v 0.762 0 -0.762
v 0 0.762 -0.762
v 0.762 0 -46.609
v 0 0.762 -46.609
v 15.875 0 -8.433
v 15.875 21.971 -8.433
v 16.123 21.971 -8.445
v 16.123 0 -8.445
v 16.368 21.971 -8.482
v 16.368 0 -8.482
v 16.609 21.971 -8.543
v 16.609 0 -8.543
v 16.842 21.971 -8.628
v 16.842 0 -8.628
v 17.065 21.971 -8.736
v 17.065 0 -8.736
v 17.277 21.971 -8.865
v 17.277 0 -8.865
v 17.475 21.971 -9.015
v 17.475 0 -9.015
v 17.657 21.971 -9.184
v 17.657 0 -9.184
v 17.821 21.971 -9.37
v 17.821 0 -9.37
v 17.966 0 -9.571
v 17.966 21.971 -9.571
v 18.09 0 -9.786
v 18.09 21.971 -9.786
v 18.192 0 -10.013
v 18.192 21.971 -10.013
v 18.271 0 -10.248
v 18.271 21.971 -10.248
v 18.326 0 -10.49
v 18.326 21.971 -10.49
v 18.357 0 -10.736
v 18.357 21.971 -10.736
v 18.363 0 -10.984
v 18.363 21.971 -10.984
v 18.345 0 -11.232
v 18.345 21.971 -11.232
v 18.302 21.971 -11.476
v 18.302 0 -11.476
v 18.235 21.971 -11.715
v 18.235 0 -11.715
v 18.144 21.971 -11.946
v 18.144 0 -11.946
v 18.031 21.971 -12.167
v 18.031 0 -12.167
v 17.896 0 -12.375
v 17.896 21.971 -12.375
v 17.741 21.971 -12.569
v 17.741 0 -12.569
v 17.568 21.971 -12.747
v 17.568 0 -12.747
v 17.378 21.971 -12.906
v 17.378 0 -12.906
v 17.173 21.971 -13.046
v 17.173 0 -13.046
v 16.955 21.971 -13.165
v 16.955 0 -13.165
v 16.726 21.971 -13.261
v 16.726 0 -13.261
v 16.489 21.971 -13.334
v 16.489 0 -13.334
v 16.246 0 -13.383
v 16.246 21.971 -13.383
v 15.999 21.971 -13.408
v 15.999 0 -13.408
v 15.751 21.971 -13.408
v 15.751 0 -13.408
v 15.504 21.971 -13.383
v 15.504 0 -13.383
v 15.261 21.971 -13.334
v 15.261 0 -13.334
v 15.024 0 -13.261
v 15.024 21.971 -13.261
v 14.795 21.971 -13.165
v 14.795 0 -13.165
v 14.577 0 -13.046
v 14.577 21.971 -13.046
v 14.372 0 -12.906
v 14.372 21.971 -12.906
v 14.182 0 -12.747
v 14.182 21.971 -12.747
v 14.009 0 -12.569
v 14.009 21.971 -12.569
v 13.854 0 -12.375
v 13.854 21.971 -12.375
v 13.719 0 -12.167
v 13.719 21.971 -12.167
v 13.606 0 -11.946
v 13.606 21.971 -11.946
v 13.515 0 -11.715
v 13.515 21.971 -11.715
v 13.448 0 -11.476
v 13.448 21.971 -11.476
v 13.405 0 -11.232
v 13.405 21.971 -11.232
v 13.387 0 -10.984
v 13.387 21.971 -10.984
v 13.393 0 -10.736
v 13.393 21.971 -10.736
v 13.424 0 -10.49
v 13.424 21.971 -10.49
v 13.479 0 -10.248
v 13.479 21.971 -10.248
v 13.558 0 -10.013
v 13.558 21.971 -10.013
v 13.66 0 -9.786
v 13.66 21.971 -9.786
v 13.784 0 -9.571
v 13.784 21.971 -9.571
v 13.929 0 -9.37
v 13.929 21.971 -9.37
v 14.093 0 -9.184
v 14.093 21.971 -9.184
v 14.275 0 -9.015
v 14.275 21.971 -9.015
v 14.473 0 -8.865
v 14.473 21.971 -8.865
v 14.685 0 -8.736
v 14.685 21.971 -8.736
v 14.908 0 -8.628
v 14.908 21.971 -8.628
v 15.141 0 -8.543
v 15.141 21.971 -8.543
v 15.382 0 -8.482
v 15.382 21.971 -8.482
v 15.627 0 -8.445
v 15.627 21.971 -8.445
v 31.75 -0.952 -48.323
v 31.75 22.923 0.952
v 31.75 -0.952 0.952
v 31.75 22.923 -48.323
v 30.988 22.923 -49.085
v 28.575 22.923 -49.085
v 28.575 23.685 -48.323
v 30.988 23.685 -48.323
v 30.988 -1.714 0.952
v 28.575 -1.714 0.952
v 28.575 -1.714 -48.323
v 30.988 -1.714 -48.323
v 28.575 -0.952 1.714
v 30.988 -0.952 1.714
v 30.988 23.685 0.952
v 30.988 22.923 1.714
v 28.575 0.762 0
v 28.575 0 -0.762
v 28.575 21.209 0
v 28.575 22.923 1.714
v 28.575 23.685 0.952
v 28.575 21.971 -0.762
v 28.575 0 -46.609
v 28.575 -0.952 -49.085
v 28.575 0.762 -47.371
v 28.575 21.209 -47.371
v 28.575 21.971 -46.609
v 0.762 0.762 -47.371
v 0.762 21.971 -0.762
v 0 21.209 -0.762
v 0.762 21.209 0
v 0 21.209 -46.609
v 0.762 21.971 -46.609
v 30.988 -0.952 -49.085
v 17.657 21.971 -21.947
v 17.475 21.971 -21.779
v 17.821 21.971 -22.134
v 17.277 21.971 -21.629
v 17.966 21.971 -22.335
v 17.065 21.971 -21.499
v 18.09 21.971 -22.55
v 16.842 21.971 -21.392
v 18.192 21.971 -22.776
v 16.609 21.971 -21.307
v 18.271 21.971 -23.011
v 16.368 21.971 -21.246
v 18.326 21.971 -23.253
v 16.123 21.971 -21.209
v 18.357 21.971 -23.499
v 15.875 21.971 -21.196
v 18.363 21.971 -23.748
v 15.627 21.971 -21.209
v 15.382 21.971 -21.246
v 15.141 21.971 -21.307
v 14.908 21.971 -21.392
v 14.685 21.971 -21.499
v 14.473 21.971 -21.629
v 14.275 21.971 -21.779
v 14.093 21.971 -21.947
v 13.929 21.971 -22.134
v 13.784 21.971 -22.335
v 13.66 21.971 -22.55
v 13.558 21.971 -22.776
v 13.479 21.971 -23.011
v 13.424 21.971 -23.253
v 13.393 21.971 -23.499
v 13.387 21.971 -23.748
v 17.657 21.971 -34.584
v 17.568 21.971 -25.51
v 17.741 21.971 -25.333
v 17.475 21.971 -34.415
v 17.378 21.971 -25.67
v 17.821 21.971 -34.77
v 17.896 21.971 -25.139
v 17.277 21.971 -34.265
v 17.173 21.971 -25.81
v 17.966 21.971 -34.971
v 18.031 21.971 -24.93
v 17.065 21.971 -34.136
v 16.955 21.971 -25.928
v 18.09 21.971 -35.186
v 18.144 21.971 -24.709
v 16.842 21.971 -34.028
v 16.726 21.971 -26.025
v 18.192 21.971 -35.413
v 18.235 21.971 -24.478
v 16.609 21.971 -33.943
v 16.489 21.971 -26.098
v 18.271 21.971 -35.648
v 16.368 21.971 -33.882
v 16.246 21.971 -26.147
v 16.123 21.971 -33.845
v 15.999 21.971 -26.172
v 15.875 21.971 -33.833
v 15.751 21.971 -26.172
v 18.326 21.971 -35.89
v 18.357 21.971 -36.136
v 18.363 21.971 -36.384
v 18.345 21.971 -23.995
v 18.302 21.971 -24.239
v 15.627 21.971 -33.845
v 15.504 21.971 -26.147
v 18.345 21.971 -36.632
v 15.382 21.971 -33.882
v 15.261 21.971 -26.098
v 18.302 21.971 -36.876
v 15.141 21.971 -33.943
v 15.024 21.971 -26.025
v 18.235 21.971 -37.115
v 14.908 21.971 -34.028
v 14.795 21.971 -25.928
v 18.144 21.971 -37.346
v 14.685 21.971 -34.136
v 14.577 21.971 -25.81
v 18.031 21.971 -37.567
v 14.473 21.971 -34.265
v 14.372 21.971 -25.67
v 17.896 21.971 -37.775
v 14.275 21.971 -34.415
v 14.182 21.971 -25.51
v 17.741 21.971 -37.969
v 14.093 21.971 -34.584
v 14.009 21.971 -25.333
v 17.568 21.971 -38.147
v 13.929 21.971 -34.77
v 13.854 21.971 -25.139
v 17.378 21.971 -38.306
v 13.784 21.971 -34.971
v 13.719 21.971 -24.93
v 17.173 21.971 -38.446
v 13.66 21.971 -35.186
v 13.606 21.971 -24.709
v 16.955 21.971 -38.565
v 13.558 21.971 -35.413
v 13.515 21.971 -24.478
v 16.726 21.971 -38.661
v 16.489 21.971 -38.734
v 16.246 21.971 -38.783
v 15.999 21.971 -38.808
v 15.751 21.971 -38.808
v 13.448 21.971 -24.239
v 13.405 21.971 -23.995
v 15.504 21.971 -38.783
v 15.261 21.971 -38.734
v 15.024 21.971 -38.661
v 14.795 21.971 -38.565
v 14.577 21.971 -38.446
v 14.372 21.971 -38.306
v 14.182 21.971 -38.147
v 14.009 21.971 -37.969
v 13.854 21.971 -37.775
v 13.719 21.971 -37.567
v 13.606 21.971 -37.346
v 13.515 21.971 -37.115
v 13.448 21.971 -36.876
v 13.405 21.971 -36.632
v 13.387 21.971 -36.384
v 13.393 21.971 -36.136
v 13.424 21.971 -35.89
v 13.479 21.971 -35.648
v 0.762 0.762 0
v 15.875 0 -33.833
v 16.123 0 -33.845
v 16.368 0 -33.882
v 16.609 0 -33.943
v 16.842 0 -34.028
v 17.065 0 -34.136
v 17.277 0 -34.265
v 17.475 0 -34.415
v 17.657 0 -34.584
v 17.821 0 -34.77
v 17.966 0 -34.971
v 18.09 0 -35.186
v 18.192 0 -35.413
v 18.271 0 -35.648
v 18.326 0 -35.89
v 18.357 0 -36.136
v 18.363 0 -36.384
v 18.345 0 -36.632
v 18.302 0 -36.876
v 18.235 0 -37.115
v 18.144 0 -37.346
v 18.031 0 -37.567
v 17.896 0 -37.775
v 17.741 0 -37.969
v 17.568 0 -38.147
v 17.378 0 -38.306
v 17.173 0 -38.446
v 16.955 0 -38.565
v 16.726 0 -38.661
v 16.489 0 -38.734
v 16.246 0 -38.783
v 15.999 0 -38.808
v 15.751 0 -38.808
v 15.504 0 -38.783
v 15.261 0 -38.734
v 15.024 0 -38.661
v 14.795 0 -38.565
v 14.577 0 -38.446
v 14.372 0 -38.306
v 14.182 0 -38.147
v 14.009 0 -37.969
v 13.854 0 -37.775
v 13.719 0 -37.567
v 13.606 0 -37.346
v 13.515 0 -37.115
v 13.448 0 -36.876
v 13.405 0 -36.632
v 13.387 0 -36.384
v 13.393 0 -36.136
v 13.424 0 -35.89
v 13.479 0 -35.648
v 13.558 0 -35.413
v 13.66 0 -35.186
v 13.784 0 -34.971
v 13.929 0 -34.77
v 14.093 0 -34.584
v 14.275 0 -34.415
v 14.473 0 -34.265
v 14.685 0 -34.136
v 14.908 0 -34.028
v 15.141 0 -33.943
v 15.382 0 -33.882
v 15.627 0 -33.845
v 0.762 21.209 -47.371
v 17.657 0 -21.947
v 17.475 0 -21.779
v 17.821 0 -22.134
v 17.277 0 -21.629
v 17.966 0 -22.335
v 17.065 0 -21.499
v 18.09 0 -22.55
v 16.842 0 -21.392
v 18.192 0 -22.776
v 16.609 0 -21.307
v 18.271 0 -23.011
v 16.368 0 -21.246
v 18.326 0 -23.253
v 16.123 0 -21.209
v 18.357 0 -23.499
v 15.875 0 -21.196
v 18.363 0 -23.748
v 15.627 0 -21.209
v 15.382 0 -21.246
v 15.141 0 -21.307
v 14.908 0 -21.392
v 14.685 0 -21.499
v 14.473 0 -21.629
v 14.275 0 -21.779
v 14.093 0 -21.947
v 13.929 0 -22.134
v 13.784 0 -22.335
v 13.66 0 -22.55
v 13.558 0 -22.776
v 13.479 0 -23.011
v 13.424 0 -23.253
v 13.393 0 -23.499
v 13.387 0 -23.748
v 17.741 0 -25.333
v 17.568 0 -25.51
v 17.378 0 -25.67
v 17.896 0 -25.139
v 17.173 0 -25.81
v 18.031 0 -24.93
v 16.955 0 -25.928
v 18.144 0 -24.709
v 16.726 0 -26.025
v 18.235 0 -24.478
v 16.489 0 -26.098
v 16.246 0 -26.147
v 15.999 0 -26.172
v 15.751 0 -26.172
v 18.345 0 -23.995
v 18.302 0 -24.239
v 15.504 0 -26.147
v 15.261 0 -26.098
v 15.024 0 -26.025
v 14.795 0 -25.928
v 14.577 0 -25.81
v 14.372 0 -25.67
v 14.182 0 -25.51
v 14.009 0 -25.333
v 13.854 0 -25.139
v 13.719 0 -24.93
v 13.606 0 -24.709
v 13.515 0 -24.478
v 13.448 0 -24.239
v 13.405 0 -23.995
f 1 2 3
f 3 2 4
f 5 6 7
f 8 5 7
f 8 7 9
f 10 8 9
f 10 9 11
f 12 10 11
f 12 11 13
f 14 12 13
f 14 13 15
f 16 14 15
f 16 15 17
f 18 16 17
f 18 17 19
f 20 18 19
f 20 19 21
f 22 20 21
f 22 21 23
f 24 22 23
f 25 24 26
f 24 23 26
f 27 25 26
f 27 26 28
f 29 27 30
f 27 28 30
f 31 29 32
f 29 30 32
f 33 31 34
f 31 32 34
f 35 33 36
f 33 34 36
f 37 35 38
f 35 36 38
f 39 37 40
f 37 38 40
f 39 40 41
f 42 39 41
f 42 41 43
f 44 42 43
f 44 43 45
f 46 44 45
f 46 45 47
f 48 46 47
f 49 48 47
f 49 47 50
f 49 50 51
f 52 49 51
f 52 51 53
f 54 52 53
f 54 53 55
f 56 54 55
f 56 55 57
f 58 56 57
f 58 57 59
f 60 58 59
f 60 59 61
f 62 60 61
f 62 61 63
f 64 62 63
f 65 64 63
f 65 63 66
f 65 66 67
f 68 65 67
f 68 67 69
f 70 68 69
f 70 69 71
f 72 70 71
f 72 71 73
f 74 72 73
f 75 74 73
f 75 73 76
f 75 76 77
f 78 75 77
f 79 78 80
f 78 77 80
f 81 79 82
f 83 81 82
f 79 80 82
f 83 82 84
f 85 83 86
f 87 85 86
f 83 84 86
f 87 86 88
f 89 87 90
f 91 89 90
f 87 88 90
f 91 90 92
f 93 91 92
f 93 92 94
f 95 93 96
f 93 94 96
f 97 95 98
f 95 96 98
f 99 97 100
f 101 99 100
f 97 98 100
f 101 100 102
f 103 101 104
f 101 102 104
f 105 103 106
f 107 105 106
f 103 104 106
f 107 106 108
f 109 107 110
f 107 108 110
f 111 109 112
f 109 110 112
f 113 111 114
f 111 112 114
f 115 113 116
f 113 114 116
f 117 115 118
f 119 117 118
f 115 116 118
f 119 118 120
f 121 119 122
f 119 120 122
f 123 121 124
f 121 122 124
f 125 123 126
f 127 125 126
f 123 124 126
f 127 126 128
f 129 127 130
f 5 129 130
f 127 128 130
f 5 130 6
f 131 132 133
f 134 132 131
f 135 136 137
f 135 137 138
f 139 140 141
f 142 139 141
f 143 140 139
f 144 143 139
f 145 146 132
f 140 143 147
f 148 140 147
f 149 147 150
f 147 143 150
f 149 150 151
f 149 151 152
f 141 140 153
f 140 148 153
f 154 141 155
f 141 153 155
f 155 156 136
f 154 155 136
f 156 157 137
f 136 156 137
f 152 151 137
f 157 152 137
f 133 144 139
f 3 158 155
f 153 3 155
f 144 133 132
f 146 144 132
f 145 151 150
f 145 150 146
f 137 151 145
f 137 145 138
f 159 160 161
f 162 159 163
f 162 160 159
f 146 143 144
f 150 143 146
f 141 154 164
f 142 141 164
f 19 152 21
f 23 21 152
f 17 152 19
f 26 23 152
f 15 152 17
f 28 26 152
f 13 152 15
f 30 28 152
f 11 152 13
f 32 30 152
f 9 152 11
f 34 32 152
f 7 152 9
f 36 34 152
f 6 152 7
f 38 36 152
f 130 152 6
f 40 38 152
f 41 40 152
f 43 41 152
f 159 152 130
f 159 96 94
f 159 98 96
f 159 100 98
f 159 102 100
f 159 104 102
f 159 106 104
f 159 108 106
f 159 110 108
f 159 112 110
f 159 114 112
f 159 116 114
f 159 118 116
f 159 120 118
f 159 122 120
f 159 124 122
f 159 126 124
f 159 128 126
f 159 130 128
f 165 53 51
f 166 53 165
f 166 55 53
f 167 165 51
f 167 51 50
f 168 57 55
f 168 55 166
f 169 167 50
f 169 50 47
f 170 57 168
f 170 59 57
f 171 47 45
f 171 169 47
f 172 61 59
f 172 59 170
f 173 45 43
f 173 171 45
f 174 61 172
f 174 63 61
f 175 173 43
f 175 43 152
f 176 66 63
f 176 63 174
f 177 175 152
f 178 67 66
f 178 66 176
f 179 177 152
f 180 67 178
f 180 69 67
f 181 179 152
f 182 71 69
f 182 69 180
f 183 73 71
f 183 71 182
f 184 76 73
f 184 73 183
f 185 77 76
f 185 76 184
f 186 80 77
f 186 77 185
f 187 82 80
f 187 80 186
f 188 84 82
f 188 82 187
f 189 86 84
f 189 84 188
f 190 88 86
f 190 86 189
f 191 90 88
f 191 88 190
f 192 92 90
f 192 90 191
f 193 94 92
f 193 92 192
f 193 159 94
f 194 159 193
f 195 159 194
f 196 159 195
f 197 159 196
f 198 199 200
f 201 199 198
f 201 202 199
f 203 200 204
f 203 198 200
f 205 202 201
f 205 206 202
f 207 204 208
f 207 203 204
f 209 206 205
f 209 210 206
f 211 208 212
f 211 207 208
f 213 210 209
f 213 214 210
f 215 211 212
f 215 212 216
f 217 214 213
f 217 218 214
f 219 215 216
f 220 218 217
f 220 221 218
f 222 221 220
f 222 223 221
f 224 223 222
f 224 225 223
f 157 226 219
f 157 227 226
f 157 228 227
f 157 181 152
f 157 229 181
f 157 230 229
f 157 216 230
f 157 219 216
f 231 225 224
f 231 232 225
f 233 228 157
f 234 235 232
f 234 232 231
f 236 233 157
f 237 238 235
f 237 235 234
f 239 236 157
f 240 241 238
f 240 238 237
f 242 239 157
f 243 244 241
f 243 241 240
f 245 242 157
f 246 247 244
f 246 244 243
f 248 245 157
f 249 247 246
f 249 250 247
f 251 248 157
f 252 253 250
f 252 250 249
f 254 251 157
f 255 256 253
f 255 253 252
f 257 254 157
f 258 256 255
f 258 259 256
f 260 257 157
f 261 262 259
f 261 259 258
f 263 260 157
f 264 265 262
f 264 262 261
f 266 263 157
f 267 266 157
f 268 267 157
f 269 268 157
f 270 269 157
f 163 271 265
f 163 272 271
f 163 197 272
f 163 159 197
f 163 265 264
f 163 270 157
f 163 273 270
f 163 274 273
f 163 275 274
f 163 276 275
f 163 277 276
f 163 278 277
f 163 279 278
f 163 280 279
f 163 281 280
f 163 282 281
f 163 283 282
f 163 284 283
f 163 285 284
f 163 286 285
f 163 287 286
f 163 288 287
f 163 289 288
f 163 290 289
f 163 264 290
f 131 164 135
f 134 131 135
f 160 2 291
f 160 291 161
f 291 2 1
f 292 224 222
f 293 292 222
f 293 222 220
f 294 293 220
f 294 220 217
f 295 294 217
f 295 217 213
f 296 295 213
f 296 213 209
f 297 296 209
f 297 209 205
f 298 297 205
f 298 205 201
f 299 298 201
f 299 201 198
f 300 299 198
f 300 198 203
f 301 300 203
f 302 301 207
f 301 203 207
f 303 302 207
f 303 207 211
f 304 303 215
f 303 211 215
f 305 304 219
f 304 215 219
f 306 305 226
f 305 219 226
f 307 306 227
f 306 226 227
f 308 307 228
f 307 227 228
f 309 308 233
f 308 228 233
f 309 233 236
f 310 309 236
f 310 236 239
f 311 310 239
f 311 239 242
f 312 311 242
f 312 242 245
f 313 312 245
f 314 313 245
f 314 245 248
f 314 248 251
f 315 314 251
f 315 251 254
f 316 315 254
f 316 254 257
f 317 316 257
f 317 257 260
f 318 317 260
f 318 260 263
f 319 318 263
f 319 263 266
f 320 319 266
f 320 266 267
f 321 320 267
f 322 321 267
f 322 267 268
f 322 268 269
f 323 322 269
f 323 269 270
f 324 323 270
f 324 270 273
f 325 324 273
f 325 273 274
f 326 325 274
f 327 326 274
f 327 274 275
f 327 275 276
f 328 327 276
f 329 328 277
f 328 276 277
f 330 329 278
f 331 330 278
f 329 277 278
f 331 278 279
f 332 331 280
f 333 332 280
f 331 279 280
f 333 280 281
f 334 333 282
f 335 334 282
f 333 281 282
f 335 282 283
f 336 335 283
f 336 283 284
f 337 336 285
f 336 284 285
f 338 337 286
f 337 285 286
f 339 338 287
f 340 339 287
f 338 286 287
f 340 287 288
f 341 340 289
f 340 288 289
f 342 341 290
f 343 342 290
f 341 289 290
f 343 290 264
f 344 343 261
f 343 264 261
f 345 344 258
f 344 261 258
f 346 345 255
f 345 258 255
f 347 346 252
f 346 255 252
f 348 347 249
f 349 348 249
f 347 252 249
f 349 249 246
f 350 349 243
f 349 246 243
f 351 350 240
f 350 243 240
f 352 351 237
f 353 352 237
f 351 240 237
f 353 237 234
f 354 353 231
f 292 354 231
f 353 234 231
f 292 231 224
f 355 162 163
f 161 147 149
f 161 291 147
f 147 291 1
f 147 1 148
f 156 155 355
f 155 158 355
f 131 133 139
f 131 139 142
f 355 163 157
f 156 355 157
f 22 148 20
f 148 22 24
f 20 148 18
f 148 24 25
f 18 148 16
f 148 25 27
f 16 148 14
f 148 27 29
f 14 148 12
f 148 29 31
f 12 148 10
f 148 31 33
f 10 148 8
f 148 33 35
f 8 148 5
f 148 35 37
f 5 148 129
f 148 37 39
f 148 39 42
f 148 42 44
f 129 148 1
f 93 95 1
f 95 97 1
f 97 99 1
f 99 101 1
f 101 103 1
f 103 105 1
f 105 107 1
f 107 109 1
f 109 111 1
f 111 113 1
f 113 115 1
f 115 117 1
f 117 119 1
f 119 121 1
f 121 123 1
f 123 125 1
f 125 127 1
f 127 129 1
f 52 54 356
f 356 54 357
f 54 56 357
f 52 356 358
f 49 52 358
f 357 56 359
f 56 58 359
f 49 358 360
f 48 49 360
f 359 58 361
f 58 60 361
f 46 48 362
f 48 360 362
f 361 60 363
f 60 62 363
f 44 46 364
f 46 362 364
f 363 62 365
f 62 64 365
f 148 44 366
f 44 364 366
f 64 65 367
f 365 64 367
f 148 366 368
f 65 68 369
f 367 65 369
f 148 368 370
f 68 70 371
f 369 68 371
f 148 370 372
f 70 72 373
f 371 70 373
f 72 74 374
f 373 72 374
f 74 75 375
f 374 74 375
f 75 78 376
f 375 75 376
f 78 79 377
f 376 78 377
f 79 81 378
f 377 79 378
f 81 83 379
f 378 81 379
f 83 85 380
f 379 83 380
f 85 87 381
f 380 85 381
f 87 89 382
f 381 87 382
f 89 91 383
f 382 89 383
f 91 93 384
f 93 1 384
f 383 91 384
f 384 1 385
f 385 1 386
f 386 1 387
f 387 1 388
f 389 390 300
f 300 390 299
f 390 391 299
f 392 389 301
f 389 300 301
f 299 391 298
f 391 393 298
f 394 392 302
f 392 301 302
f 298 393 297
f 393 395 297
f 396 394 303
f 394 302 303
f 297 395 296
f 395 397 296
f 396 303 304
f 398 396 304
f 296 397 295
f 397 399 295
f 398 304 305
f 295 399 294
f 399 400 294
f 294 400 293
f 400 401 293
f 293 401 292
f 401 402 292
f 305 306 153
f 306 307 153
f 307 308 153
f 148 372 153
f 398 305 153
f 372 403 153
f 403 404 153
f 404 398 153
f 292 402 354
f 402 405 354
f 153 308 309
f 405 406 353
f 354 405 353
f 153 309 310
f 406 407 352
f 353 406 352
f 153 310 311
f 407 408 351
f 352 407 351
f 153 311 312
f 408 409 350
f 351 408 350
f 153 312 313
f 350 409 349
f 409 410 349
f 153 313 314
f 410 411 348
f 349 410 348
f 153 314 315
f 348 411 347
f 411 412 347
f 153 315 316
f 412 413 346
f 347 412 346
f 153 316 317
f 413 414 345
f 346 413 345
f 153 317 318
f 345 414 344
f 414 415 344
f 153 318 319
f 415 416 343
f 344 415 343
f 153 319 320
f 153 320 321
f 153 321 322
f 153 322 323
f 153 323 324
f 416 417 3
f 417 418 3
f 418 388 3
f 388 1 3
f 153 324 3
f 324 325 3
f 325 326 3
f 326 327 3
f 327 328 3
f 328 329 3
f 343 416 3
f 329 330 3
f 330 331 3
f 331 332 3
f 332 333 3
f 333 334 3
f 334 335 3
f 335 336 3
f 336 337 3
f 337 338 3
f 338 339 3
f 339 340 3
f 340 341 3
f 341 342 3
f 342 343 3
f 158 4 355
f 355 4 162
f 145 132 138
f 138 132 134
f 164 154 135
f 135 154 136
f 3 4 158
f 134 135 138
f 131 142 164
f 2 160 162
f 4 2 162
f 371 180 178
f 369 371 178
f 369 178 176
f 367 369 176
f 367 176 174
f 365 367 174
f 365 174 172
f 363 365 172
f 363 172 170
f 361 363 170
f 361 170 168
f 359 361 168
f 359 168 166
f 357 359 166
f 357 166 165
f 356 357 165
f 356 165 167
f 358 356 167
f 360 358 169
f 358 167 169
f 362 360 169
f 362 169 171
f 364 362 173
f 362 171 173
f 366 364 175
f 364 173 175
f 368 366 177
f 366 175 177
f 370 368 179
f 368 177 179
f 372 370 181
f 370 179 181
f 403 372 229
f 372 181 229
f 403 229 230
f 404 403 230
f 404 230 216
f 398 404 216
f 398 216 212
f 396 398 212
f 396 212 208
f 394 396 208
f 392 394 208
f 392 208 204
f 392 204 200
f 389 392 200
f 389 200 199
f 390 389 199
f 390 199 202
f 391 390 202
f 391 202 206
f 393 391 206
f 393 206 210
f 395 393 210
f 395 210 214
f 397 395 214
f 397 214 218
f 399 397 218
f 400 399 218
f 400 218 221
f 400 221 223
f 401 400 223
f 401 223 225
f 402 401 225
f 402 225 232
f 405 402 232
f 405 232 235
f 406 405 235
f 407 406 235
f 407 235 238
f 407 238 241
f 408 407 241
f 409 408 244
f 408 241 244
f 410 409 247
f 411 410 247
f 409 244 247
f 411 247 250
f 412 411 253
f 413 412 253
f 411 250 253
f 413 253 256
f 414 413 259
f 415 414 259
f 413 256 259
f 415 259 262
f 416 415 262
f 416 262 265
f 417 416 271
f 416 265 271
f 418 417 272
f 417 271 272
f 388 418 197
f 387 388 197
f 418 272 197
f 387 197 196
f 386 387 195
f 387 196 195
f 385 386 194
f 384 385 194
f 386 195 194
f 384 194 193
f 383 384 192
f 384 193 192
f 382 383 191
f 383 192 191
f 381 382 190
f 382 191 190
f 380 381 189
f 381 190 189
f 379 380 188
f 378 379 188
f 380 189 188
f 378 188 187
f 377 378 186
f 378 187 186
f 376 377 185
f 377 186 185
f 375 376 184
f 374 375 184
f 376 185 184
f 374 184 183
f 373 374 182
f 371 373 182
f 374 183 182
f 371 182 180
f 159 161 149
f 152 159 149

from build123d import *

# Parameters (mm, degrees)
SKETCH1_W           = 47.371
SKETCH1_H           = 21.971
BOSS_EXTRUDE1_DEPTH = 28.575
SKETCH2_W           = 50.8
SKETCH2_H           = 25.4
BOSS_EXTRUDE2_DEPTH = 3.175
CHAMFER1_SIZE       = 0.762
SKETCH3_R           = 2.4892
CUT_EXTRUDE1_DEPTH  = 64.074969049


with BuildPart() as part:
    # Sketch1 → Boss-Extrude1 (new body)
    with BuildSketch(Plane(origin=(0, 0, 0), x_dir=(0, 0, -1), z_dir=(1, 0, 0))):
        with Locations((23.6855, 10.9855)):
            Rectangle(SKETCH1_W, SKETCH1_H)
    extrude(amount=BOSS_EXTRUDE1_DEPTH)

    # Sketch2 → Boss-Extrude2 (add)
    with BuildSketch(Plane(origin=(28.575, 0, 0), x_dir=(0, 0, -1), z_dir=(1, 0, 0))):
        with Locations((23.6855, 10.9855)):
            Rectangle(SKETCH2_W, SKETCH2_H)
    extrude(amount=BOSS_EXTRUDE2_DEPTH)

    # Chamfer1
    chamfer1_edges = [part.edges().sort_by_distance(p)[0] for p in [
        (30.1625, 23.6855, 1.7145),
        (30.1625, -1.7145, 1.7145),
        (30.1625, -1.7145, -49.0855),
        (30.1625, 23.6855, -49.0855),
        (31.75, 10.9855, 1.7145),
        (31.75, -1.7145, -23.6855),
        (31.75, 10.9855, -49.0855),
        (31.75, 23.6855, -23.6855),
        (0, 21.971, -23.6855),
        (0, 10.9855, -47.371),
        (0, 0, -23.6855),
        (0, 10.9855, 0),
        (14.2875, 21.971, 0),
        (14.2875, 21.971, -47.371),
        (14.2875, 0, -47.371),
        (14.2875, 0, 0),
    ]]
    chamfer(chamfer1_edges, length=CHAMFER1_SIZE)

    # Sketch3 → Cut-Extrude1 (cut, through all)
    with BuildSketch(Plane(origin=(0, 21.971, 0), x_dir=(1, 0, 0), z_dir=(0, 1, 0))):
        with Locations(Location((15.875, 23.6855, 0), (0, 0, 270))):
            Circle(SKETCH3_R)
        with Locations(Location((15.875, 36.322, 0), (0, 0, 270))):
            Circle(SKETCH3_R)
        with Locations(Location((15.875, 10.922, 0), (0, 0, 270))):
            Circle(SKETCH3_R)
    extrude(amount=-CUT_EXTRUDE1_DEPTH, mode=Mode.SUBTRACT)


solid = part.part
